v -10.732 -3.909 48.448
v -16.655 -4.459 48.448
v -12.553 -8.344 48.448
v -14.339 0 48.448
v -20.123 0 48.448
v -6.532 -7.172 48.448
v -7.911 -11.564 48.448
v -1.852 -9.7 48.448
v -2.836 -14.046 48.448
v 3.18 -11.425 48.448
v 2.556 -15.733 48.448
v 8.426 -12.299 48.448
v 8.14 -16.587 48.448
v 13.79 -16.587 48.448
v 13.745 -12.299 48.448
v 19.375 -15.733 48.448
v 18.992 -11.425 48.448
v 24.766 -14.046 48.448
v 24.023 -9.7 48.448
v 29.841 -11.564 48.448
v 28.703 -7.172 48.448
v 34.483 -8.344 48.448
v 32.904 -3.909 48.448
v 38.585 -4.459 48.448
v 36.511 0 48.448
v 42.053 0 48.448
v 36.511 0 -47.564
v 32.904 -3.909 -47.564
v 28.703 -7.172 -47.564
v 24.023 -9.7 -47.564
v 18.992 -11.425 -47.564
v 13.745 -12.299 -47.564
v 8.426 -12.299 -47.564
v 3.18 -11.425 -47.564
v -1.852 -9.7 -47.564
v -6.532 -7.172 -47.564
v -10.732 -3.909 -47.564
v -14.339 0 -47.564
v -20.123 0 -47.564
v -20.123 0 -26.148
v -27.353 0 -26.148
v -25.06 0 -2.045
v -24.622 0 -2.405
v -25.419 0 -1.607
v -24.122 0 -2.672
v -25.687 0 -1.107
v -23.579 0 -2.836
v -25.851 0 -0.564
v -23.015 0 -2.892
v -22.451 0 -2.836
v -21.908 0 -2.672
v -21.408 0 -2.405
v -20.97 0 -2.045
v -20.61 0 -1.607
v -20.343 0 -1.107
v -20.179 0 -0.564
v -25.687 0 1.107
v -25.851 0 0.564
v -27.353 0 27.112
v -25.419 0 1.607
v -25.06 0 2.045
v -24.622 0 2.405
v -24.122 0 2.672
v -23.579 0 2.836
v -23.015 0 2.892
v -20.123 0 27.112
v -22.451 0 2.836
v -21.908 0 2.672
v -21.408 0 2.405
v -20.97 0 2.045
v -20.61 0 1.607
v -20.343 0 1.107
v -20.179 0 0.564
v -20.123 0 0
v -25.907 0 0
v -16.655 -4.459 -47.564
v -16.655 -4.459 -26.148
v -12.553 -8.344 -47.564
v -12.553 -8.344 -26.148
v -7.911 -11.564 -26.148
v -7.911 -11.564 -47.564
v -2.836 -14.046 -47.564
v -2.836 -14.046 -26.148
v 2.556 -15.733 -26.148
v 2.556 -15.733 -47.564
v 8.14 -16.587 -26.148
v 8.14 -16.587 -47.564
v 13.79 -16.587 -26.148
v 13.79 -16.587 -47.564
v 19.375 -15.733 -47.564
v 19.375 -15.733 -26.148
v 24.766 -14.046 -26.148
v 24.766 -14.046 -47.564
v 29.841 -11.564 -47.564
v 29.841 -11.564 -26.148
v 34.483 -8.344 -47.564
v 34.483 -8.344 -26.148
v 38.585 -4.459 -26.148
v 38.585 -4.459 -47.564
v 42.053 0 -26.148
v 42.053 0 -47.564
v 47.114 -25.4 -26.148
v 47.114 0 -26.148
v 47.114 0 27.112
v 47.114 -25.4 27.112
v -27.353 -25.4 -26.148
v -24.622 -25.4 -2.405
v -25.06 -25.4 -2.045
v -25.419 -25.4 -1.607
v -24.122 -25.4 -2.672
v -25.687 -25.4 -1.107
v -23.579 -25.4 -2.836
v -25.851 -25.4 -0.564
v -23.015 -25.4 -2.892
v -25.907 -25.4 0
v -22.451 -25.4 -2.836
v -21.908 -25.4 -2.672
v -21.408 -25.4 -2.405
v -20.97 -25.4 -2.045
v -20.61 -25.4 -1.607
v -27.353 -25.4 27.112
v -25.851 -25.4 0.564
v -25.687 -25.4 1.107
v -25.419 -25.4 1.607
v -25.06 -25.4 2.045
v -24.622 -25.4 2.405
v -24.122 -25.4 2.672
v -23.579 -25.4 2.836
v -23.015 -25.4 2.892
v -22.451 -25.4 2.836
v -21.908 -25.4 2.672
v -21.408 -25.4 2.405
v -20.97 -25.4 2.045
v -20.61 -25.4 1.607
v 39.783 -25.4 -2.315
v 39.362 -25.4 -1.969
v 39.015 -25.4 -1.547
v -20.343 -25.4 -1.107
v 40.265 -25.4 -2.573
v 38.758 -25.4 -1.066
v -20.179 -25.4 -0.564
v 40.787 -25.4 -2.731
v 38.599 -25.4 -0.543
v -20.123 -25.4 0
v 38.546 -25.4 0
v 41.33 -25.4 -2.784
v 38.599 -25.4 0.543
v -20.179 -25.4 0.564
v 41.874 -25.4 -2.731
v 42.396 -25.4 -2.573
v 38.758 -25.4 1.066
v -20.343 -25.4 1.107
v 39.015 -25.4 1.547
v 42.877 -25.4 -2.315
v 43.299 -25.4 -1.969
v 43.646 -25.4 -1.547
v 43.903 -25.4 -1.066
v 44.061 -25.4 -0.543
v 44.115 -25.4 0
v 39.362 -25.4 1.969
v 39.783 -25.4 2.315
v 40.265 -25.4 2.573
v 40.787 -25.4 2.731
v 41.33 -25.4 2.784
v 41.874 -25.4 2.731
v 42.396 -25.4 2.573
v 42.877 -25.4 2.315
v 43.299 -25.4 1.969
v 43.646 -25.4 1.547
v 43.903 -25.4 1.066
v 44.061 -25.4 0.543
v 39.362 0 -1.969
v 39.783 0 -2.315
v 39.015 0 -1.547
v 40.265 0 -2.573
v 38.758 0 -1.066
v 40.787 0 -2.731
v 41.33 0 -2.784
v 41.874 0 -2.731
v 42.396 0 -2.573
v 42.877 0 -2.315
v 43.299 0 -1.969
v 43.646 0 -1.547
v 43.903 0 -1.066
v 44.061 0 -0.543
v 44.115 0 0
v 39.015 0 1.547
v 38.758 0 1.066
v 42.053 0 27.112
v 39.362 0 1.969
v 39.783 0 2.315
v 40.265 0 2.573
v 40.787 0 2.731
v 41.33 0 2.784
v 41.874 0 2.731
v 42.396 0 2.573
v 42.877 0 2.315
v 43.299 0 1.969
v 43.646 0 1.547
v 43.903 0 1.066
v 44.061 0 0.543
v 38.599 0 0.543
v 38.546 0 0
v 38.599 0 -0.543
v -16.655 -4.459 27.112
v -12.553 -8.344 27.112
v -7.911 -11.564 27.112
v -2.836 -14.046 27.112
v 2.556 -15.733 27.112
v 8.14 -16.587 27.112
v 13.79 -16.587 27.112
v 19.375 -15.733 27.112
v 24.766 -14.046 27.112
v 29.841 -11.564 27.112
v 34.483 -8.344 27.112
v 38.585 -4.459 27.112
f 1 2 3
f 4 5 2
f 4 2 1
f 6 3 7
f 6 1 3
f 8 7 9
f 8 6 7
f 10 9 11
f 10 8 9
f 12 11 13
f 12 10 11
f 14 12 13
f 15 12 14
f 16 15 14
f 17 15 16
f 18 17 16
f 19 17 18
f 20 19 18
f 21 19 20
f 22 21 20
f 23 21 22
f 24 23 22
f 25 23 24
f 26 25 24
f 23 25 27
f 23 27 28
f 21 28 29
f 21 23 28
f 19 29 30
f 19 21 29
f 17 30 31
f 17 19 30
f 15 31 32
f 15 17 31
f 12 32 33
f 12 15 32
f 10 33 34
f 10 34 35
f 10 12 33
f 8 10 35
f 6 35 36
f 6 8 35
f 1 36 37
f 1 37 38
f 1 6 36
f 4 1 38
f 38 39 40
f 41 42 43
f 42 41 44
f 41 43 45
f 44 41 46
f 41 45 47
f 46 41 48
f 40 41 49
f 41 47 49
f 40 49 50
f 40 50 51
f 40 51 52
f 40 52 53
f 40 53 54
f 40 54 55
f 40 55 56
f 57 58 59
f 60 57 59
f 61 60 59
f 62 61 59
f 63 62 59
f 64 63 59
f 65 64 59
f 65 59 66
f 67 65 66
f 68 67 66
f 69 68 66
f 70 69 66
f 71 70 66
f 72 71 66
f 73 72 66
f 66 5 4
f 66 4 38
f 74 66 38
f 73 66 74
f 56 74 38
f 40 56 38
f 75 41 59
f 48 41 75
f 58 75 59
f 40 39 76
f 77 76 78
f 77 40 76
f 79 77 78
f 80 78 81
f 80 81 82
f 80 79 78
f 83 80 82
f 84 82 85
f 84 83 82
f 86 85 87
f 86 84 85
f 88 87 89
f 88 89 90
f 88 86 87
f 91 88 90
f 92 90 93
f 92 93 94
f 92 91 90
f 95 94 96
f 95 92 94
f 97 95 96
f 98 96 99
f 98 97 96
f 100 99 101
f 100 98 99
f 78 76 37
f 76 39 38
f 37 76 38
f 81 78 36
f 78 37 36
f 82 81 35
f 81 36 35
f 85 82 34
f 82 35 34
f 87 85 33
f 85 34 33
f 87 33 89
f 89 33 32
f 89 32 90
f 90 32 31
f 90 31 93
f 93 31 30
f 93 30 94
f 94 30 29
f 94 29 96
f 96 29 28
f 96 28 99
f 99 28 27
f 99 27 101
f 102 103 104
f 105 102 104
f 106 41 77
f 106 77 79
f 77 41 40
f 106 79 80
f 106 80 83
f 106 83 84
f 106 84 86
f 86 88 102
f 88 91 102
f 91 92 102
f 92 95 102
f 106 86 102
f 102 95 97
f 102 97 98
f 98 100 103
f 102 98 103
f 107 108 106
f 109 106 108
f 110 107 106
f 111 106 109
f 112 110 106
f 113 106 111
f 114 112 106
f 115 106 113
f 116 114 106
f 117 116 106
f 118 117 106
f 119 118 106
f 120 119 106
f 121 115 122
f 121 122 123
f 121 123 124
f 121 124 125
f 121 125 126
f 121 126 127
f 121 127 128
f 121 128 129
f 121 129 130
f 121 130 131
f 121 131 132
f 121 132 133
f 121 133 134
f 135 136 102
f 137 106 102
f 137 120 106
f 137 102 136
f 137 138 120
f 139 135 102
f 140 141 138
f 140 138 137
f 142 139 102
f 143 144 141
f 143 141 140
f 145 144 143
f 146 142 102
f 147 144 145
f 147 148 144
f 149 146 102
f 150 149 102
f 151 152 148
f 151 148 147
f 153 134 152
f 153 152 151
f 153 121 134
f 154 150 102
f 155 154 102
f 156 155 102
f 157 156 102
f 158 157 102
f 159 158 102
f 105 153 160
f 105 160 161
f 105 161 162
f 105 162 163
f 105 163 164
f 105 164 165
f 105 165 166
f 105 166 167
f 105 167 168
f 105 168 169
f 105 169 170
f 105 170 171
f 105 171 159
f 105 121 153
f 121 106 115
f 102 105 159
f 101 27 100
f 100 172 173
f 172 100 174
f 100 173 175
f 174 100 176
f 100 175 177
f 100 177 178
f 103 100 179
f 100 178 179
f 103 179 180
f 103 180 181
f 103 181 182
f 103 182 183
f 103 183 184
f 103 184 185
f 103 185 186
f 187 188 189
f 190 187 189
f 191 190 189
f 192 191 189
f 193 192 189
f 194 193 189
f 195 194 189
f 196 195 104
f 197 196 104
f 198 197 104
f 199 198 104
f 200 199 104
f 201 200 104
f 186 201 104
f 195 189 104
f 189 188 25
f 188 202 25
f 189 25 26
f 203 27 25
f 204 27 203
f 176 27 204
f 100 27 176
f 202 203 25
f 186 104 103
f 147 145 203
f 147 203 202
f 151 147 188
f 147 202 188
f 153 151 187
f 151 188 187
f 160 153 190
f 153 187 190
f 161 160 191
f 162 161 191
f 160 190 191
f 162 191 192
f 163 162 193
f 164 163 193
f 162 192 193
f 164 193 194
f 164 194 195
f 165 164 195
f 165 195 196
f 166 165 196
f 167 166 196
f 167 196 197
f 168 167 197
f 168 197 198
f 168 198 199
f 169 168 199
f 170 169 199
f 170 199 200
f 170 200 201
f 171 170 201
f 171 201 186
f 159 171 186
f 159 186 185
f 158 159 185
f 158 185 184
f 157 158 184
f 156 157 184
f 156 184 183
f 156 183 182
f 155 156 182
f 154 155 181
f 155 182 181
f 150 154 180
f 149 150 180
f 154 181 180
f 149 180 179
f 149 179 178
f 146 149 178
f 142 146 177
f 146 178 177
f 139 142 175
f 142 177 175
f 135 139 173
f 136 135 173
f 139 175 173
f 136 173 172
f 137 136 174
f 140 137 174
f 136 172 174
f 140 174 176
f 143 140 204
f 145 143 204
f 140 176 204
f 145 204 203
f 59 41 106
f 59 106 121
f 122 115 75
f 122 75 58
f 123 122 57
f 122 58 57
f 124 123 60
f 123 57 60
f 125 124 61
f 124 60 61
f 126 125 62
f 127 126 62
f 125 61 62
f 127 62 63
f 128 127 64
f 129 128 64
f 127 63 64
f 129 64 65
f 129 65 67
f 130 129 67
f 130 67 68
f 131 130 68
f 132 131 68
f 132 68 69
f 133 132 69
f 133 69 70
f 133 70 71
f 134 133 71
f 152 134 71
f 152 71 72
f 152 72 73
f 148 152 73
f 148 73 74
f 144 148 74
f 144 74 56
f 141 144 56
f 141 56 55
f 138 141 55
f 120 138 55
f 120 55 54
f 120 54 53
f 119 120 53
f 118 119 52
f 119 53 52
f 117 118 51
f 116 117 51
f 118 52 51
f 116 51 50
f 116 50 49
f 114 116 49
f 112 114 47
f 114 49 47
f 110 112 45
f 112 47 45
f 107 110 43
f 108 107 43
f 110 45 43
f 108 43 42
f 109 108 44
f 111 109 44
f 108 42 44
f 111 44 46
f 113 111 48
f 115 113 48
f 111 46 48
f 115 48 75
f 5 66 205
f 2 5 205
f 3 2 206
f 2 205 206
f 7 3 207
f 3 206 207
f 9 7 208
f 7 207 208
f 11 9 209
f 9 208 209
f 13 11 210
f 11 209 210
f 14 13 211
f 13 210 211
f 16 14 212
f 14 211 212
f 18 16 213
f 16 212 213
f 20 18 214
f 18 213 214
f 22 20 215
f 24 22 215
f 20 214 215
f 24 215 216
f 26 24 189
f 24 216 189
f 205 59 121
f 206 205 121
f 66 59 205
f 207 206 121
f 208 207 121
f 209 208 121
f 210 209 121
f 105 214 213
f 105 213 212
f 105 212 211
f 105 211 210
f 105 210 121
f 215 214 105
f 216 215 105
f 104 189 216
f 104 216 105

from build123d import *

# Parameters (mm, degrees)
F0_W     = 74.4671411812
F0_H     = 53.2596688718
F1_DEPTH = 25.4
F3_DEPTH = 74.676
F4_DEPTH = 96.012
F5_DEPTH = 126.238
F6_R     = 2.8919279575
F7_DEPTH = 69.596
F8_R     = 2.7844971125
F9_DEPTH = 71.374


with BuildPart() as f1:
    # F0 (on Front) → F1 (new body)
    with BuildSketch(Plane.XZ):
        with Locations((9.880753234, 0.4819883034)):
            Rectangle(F0_W, F0_H)
    extrude(amount=F1_DEPTH)

    # F2 (on face) → F3 (join)
    with BuildSketch(Plane.XY.offset(27.1118227392)):
        with BuildLine():
            ThreePointArc((36.5105904639, 0), (11.0857244581, -12.4089535166), (-14.3391415477, 0))
            Line((-14.3391415477, 0), (-20.1229974627, 0))
            ThreePointArc((-20.1229974627, 0), (10.9652262181, -16.6939246271), (42.053449899, 0))
            Line((42.053449899, 0), (36.5105904639, 0))
        make_face()
    extrude(amount=-F3_DEPTH)

    # F4 (add): a face of the model
    f4_faces = [f1.faces().sort_by_distance(p)[0] for p in [
        (39.2820201814, -0.643785502, -47.5641772608),
    ]]
    extrude(f4_faces, amount=-F4_DEPTH)

    # F5 (cut): a face of the model
    f5_faces = [f1.faces().sort_by_distance(p)[0] for p in [
        (11.0857244581, -5.0557746848, 27.1118227392),
    ]]
    extrude(f5_faces, amount=-F5_DEPTH, mode=Mode.SUBTRACT)

    # F6 (on face) → F7 (cut)
    with BuildSketch(Plane(origin=(0, 0, 0), x_dir=(-1, 0, 0), z_dir=(0, 1, 0))):
        with Locations((23.0149254203, 0)):
            Circle(F6_R)
    extrude(amount=-F7_DEPTH, mode=Mode.SUBTRACT)

    # F8 (on face) → F9 (cut)
    with BuildSketch(Plane(origin=(0, 0, 0), x_dir=(-1, 0, 0), z_dir=(0, 1, 0))):
        with Locations((-41.3304679096, 0)):
            Circle(F8_R)
    extrude(amount=-F9_DEPTH, mode=Mode.SUBTRACT)


solid = f1.part
